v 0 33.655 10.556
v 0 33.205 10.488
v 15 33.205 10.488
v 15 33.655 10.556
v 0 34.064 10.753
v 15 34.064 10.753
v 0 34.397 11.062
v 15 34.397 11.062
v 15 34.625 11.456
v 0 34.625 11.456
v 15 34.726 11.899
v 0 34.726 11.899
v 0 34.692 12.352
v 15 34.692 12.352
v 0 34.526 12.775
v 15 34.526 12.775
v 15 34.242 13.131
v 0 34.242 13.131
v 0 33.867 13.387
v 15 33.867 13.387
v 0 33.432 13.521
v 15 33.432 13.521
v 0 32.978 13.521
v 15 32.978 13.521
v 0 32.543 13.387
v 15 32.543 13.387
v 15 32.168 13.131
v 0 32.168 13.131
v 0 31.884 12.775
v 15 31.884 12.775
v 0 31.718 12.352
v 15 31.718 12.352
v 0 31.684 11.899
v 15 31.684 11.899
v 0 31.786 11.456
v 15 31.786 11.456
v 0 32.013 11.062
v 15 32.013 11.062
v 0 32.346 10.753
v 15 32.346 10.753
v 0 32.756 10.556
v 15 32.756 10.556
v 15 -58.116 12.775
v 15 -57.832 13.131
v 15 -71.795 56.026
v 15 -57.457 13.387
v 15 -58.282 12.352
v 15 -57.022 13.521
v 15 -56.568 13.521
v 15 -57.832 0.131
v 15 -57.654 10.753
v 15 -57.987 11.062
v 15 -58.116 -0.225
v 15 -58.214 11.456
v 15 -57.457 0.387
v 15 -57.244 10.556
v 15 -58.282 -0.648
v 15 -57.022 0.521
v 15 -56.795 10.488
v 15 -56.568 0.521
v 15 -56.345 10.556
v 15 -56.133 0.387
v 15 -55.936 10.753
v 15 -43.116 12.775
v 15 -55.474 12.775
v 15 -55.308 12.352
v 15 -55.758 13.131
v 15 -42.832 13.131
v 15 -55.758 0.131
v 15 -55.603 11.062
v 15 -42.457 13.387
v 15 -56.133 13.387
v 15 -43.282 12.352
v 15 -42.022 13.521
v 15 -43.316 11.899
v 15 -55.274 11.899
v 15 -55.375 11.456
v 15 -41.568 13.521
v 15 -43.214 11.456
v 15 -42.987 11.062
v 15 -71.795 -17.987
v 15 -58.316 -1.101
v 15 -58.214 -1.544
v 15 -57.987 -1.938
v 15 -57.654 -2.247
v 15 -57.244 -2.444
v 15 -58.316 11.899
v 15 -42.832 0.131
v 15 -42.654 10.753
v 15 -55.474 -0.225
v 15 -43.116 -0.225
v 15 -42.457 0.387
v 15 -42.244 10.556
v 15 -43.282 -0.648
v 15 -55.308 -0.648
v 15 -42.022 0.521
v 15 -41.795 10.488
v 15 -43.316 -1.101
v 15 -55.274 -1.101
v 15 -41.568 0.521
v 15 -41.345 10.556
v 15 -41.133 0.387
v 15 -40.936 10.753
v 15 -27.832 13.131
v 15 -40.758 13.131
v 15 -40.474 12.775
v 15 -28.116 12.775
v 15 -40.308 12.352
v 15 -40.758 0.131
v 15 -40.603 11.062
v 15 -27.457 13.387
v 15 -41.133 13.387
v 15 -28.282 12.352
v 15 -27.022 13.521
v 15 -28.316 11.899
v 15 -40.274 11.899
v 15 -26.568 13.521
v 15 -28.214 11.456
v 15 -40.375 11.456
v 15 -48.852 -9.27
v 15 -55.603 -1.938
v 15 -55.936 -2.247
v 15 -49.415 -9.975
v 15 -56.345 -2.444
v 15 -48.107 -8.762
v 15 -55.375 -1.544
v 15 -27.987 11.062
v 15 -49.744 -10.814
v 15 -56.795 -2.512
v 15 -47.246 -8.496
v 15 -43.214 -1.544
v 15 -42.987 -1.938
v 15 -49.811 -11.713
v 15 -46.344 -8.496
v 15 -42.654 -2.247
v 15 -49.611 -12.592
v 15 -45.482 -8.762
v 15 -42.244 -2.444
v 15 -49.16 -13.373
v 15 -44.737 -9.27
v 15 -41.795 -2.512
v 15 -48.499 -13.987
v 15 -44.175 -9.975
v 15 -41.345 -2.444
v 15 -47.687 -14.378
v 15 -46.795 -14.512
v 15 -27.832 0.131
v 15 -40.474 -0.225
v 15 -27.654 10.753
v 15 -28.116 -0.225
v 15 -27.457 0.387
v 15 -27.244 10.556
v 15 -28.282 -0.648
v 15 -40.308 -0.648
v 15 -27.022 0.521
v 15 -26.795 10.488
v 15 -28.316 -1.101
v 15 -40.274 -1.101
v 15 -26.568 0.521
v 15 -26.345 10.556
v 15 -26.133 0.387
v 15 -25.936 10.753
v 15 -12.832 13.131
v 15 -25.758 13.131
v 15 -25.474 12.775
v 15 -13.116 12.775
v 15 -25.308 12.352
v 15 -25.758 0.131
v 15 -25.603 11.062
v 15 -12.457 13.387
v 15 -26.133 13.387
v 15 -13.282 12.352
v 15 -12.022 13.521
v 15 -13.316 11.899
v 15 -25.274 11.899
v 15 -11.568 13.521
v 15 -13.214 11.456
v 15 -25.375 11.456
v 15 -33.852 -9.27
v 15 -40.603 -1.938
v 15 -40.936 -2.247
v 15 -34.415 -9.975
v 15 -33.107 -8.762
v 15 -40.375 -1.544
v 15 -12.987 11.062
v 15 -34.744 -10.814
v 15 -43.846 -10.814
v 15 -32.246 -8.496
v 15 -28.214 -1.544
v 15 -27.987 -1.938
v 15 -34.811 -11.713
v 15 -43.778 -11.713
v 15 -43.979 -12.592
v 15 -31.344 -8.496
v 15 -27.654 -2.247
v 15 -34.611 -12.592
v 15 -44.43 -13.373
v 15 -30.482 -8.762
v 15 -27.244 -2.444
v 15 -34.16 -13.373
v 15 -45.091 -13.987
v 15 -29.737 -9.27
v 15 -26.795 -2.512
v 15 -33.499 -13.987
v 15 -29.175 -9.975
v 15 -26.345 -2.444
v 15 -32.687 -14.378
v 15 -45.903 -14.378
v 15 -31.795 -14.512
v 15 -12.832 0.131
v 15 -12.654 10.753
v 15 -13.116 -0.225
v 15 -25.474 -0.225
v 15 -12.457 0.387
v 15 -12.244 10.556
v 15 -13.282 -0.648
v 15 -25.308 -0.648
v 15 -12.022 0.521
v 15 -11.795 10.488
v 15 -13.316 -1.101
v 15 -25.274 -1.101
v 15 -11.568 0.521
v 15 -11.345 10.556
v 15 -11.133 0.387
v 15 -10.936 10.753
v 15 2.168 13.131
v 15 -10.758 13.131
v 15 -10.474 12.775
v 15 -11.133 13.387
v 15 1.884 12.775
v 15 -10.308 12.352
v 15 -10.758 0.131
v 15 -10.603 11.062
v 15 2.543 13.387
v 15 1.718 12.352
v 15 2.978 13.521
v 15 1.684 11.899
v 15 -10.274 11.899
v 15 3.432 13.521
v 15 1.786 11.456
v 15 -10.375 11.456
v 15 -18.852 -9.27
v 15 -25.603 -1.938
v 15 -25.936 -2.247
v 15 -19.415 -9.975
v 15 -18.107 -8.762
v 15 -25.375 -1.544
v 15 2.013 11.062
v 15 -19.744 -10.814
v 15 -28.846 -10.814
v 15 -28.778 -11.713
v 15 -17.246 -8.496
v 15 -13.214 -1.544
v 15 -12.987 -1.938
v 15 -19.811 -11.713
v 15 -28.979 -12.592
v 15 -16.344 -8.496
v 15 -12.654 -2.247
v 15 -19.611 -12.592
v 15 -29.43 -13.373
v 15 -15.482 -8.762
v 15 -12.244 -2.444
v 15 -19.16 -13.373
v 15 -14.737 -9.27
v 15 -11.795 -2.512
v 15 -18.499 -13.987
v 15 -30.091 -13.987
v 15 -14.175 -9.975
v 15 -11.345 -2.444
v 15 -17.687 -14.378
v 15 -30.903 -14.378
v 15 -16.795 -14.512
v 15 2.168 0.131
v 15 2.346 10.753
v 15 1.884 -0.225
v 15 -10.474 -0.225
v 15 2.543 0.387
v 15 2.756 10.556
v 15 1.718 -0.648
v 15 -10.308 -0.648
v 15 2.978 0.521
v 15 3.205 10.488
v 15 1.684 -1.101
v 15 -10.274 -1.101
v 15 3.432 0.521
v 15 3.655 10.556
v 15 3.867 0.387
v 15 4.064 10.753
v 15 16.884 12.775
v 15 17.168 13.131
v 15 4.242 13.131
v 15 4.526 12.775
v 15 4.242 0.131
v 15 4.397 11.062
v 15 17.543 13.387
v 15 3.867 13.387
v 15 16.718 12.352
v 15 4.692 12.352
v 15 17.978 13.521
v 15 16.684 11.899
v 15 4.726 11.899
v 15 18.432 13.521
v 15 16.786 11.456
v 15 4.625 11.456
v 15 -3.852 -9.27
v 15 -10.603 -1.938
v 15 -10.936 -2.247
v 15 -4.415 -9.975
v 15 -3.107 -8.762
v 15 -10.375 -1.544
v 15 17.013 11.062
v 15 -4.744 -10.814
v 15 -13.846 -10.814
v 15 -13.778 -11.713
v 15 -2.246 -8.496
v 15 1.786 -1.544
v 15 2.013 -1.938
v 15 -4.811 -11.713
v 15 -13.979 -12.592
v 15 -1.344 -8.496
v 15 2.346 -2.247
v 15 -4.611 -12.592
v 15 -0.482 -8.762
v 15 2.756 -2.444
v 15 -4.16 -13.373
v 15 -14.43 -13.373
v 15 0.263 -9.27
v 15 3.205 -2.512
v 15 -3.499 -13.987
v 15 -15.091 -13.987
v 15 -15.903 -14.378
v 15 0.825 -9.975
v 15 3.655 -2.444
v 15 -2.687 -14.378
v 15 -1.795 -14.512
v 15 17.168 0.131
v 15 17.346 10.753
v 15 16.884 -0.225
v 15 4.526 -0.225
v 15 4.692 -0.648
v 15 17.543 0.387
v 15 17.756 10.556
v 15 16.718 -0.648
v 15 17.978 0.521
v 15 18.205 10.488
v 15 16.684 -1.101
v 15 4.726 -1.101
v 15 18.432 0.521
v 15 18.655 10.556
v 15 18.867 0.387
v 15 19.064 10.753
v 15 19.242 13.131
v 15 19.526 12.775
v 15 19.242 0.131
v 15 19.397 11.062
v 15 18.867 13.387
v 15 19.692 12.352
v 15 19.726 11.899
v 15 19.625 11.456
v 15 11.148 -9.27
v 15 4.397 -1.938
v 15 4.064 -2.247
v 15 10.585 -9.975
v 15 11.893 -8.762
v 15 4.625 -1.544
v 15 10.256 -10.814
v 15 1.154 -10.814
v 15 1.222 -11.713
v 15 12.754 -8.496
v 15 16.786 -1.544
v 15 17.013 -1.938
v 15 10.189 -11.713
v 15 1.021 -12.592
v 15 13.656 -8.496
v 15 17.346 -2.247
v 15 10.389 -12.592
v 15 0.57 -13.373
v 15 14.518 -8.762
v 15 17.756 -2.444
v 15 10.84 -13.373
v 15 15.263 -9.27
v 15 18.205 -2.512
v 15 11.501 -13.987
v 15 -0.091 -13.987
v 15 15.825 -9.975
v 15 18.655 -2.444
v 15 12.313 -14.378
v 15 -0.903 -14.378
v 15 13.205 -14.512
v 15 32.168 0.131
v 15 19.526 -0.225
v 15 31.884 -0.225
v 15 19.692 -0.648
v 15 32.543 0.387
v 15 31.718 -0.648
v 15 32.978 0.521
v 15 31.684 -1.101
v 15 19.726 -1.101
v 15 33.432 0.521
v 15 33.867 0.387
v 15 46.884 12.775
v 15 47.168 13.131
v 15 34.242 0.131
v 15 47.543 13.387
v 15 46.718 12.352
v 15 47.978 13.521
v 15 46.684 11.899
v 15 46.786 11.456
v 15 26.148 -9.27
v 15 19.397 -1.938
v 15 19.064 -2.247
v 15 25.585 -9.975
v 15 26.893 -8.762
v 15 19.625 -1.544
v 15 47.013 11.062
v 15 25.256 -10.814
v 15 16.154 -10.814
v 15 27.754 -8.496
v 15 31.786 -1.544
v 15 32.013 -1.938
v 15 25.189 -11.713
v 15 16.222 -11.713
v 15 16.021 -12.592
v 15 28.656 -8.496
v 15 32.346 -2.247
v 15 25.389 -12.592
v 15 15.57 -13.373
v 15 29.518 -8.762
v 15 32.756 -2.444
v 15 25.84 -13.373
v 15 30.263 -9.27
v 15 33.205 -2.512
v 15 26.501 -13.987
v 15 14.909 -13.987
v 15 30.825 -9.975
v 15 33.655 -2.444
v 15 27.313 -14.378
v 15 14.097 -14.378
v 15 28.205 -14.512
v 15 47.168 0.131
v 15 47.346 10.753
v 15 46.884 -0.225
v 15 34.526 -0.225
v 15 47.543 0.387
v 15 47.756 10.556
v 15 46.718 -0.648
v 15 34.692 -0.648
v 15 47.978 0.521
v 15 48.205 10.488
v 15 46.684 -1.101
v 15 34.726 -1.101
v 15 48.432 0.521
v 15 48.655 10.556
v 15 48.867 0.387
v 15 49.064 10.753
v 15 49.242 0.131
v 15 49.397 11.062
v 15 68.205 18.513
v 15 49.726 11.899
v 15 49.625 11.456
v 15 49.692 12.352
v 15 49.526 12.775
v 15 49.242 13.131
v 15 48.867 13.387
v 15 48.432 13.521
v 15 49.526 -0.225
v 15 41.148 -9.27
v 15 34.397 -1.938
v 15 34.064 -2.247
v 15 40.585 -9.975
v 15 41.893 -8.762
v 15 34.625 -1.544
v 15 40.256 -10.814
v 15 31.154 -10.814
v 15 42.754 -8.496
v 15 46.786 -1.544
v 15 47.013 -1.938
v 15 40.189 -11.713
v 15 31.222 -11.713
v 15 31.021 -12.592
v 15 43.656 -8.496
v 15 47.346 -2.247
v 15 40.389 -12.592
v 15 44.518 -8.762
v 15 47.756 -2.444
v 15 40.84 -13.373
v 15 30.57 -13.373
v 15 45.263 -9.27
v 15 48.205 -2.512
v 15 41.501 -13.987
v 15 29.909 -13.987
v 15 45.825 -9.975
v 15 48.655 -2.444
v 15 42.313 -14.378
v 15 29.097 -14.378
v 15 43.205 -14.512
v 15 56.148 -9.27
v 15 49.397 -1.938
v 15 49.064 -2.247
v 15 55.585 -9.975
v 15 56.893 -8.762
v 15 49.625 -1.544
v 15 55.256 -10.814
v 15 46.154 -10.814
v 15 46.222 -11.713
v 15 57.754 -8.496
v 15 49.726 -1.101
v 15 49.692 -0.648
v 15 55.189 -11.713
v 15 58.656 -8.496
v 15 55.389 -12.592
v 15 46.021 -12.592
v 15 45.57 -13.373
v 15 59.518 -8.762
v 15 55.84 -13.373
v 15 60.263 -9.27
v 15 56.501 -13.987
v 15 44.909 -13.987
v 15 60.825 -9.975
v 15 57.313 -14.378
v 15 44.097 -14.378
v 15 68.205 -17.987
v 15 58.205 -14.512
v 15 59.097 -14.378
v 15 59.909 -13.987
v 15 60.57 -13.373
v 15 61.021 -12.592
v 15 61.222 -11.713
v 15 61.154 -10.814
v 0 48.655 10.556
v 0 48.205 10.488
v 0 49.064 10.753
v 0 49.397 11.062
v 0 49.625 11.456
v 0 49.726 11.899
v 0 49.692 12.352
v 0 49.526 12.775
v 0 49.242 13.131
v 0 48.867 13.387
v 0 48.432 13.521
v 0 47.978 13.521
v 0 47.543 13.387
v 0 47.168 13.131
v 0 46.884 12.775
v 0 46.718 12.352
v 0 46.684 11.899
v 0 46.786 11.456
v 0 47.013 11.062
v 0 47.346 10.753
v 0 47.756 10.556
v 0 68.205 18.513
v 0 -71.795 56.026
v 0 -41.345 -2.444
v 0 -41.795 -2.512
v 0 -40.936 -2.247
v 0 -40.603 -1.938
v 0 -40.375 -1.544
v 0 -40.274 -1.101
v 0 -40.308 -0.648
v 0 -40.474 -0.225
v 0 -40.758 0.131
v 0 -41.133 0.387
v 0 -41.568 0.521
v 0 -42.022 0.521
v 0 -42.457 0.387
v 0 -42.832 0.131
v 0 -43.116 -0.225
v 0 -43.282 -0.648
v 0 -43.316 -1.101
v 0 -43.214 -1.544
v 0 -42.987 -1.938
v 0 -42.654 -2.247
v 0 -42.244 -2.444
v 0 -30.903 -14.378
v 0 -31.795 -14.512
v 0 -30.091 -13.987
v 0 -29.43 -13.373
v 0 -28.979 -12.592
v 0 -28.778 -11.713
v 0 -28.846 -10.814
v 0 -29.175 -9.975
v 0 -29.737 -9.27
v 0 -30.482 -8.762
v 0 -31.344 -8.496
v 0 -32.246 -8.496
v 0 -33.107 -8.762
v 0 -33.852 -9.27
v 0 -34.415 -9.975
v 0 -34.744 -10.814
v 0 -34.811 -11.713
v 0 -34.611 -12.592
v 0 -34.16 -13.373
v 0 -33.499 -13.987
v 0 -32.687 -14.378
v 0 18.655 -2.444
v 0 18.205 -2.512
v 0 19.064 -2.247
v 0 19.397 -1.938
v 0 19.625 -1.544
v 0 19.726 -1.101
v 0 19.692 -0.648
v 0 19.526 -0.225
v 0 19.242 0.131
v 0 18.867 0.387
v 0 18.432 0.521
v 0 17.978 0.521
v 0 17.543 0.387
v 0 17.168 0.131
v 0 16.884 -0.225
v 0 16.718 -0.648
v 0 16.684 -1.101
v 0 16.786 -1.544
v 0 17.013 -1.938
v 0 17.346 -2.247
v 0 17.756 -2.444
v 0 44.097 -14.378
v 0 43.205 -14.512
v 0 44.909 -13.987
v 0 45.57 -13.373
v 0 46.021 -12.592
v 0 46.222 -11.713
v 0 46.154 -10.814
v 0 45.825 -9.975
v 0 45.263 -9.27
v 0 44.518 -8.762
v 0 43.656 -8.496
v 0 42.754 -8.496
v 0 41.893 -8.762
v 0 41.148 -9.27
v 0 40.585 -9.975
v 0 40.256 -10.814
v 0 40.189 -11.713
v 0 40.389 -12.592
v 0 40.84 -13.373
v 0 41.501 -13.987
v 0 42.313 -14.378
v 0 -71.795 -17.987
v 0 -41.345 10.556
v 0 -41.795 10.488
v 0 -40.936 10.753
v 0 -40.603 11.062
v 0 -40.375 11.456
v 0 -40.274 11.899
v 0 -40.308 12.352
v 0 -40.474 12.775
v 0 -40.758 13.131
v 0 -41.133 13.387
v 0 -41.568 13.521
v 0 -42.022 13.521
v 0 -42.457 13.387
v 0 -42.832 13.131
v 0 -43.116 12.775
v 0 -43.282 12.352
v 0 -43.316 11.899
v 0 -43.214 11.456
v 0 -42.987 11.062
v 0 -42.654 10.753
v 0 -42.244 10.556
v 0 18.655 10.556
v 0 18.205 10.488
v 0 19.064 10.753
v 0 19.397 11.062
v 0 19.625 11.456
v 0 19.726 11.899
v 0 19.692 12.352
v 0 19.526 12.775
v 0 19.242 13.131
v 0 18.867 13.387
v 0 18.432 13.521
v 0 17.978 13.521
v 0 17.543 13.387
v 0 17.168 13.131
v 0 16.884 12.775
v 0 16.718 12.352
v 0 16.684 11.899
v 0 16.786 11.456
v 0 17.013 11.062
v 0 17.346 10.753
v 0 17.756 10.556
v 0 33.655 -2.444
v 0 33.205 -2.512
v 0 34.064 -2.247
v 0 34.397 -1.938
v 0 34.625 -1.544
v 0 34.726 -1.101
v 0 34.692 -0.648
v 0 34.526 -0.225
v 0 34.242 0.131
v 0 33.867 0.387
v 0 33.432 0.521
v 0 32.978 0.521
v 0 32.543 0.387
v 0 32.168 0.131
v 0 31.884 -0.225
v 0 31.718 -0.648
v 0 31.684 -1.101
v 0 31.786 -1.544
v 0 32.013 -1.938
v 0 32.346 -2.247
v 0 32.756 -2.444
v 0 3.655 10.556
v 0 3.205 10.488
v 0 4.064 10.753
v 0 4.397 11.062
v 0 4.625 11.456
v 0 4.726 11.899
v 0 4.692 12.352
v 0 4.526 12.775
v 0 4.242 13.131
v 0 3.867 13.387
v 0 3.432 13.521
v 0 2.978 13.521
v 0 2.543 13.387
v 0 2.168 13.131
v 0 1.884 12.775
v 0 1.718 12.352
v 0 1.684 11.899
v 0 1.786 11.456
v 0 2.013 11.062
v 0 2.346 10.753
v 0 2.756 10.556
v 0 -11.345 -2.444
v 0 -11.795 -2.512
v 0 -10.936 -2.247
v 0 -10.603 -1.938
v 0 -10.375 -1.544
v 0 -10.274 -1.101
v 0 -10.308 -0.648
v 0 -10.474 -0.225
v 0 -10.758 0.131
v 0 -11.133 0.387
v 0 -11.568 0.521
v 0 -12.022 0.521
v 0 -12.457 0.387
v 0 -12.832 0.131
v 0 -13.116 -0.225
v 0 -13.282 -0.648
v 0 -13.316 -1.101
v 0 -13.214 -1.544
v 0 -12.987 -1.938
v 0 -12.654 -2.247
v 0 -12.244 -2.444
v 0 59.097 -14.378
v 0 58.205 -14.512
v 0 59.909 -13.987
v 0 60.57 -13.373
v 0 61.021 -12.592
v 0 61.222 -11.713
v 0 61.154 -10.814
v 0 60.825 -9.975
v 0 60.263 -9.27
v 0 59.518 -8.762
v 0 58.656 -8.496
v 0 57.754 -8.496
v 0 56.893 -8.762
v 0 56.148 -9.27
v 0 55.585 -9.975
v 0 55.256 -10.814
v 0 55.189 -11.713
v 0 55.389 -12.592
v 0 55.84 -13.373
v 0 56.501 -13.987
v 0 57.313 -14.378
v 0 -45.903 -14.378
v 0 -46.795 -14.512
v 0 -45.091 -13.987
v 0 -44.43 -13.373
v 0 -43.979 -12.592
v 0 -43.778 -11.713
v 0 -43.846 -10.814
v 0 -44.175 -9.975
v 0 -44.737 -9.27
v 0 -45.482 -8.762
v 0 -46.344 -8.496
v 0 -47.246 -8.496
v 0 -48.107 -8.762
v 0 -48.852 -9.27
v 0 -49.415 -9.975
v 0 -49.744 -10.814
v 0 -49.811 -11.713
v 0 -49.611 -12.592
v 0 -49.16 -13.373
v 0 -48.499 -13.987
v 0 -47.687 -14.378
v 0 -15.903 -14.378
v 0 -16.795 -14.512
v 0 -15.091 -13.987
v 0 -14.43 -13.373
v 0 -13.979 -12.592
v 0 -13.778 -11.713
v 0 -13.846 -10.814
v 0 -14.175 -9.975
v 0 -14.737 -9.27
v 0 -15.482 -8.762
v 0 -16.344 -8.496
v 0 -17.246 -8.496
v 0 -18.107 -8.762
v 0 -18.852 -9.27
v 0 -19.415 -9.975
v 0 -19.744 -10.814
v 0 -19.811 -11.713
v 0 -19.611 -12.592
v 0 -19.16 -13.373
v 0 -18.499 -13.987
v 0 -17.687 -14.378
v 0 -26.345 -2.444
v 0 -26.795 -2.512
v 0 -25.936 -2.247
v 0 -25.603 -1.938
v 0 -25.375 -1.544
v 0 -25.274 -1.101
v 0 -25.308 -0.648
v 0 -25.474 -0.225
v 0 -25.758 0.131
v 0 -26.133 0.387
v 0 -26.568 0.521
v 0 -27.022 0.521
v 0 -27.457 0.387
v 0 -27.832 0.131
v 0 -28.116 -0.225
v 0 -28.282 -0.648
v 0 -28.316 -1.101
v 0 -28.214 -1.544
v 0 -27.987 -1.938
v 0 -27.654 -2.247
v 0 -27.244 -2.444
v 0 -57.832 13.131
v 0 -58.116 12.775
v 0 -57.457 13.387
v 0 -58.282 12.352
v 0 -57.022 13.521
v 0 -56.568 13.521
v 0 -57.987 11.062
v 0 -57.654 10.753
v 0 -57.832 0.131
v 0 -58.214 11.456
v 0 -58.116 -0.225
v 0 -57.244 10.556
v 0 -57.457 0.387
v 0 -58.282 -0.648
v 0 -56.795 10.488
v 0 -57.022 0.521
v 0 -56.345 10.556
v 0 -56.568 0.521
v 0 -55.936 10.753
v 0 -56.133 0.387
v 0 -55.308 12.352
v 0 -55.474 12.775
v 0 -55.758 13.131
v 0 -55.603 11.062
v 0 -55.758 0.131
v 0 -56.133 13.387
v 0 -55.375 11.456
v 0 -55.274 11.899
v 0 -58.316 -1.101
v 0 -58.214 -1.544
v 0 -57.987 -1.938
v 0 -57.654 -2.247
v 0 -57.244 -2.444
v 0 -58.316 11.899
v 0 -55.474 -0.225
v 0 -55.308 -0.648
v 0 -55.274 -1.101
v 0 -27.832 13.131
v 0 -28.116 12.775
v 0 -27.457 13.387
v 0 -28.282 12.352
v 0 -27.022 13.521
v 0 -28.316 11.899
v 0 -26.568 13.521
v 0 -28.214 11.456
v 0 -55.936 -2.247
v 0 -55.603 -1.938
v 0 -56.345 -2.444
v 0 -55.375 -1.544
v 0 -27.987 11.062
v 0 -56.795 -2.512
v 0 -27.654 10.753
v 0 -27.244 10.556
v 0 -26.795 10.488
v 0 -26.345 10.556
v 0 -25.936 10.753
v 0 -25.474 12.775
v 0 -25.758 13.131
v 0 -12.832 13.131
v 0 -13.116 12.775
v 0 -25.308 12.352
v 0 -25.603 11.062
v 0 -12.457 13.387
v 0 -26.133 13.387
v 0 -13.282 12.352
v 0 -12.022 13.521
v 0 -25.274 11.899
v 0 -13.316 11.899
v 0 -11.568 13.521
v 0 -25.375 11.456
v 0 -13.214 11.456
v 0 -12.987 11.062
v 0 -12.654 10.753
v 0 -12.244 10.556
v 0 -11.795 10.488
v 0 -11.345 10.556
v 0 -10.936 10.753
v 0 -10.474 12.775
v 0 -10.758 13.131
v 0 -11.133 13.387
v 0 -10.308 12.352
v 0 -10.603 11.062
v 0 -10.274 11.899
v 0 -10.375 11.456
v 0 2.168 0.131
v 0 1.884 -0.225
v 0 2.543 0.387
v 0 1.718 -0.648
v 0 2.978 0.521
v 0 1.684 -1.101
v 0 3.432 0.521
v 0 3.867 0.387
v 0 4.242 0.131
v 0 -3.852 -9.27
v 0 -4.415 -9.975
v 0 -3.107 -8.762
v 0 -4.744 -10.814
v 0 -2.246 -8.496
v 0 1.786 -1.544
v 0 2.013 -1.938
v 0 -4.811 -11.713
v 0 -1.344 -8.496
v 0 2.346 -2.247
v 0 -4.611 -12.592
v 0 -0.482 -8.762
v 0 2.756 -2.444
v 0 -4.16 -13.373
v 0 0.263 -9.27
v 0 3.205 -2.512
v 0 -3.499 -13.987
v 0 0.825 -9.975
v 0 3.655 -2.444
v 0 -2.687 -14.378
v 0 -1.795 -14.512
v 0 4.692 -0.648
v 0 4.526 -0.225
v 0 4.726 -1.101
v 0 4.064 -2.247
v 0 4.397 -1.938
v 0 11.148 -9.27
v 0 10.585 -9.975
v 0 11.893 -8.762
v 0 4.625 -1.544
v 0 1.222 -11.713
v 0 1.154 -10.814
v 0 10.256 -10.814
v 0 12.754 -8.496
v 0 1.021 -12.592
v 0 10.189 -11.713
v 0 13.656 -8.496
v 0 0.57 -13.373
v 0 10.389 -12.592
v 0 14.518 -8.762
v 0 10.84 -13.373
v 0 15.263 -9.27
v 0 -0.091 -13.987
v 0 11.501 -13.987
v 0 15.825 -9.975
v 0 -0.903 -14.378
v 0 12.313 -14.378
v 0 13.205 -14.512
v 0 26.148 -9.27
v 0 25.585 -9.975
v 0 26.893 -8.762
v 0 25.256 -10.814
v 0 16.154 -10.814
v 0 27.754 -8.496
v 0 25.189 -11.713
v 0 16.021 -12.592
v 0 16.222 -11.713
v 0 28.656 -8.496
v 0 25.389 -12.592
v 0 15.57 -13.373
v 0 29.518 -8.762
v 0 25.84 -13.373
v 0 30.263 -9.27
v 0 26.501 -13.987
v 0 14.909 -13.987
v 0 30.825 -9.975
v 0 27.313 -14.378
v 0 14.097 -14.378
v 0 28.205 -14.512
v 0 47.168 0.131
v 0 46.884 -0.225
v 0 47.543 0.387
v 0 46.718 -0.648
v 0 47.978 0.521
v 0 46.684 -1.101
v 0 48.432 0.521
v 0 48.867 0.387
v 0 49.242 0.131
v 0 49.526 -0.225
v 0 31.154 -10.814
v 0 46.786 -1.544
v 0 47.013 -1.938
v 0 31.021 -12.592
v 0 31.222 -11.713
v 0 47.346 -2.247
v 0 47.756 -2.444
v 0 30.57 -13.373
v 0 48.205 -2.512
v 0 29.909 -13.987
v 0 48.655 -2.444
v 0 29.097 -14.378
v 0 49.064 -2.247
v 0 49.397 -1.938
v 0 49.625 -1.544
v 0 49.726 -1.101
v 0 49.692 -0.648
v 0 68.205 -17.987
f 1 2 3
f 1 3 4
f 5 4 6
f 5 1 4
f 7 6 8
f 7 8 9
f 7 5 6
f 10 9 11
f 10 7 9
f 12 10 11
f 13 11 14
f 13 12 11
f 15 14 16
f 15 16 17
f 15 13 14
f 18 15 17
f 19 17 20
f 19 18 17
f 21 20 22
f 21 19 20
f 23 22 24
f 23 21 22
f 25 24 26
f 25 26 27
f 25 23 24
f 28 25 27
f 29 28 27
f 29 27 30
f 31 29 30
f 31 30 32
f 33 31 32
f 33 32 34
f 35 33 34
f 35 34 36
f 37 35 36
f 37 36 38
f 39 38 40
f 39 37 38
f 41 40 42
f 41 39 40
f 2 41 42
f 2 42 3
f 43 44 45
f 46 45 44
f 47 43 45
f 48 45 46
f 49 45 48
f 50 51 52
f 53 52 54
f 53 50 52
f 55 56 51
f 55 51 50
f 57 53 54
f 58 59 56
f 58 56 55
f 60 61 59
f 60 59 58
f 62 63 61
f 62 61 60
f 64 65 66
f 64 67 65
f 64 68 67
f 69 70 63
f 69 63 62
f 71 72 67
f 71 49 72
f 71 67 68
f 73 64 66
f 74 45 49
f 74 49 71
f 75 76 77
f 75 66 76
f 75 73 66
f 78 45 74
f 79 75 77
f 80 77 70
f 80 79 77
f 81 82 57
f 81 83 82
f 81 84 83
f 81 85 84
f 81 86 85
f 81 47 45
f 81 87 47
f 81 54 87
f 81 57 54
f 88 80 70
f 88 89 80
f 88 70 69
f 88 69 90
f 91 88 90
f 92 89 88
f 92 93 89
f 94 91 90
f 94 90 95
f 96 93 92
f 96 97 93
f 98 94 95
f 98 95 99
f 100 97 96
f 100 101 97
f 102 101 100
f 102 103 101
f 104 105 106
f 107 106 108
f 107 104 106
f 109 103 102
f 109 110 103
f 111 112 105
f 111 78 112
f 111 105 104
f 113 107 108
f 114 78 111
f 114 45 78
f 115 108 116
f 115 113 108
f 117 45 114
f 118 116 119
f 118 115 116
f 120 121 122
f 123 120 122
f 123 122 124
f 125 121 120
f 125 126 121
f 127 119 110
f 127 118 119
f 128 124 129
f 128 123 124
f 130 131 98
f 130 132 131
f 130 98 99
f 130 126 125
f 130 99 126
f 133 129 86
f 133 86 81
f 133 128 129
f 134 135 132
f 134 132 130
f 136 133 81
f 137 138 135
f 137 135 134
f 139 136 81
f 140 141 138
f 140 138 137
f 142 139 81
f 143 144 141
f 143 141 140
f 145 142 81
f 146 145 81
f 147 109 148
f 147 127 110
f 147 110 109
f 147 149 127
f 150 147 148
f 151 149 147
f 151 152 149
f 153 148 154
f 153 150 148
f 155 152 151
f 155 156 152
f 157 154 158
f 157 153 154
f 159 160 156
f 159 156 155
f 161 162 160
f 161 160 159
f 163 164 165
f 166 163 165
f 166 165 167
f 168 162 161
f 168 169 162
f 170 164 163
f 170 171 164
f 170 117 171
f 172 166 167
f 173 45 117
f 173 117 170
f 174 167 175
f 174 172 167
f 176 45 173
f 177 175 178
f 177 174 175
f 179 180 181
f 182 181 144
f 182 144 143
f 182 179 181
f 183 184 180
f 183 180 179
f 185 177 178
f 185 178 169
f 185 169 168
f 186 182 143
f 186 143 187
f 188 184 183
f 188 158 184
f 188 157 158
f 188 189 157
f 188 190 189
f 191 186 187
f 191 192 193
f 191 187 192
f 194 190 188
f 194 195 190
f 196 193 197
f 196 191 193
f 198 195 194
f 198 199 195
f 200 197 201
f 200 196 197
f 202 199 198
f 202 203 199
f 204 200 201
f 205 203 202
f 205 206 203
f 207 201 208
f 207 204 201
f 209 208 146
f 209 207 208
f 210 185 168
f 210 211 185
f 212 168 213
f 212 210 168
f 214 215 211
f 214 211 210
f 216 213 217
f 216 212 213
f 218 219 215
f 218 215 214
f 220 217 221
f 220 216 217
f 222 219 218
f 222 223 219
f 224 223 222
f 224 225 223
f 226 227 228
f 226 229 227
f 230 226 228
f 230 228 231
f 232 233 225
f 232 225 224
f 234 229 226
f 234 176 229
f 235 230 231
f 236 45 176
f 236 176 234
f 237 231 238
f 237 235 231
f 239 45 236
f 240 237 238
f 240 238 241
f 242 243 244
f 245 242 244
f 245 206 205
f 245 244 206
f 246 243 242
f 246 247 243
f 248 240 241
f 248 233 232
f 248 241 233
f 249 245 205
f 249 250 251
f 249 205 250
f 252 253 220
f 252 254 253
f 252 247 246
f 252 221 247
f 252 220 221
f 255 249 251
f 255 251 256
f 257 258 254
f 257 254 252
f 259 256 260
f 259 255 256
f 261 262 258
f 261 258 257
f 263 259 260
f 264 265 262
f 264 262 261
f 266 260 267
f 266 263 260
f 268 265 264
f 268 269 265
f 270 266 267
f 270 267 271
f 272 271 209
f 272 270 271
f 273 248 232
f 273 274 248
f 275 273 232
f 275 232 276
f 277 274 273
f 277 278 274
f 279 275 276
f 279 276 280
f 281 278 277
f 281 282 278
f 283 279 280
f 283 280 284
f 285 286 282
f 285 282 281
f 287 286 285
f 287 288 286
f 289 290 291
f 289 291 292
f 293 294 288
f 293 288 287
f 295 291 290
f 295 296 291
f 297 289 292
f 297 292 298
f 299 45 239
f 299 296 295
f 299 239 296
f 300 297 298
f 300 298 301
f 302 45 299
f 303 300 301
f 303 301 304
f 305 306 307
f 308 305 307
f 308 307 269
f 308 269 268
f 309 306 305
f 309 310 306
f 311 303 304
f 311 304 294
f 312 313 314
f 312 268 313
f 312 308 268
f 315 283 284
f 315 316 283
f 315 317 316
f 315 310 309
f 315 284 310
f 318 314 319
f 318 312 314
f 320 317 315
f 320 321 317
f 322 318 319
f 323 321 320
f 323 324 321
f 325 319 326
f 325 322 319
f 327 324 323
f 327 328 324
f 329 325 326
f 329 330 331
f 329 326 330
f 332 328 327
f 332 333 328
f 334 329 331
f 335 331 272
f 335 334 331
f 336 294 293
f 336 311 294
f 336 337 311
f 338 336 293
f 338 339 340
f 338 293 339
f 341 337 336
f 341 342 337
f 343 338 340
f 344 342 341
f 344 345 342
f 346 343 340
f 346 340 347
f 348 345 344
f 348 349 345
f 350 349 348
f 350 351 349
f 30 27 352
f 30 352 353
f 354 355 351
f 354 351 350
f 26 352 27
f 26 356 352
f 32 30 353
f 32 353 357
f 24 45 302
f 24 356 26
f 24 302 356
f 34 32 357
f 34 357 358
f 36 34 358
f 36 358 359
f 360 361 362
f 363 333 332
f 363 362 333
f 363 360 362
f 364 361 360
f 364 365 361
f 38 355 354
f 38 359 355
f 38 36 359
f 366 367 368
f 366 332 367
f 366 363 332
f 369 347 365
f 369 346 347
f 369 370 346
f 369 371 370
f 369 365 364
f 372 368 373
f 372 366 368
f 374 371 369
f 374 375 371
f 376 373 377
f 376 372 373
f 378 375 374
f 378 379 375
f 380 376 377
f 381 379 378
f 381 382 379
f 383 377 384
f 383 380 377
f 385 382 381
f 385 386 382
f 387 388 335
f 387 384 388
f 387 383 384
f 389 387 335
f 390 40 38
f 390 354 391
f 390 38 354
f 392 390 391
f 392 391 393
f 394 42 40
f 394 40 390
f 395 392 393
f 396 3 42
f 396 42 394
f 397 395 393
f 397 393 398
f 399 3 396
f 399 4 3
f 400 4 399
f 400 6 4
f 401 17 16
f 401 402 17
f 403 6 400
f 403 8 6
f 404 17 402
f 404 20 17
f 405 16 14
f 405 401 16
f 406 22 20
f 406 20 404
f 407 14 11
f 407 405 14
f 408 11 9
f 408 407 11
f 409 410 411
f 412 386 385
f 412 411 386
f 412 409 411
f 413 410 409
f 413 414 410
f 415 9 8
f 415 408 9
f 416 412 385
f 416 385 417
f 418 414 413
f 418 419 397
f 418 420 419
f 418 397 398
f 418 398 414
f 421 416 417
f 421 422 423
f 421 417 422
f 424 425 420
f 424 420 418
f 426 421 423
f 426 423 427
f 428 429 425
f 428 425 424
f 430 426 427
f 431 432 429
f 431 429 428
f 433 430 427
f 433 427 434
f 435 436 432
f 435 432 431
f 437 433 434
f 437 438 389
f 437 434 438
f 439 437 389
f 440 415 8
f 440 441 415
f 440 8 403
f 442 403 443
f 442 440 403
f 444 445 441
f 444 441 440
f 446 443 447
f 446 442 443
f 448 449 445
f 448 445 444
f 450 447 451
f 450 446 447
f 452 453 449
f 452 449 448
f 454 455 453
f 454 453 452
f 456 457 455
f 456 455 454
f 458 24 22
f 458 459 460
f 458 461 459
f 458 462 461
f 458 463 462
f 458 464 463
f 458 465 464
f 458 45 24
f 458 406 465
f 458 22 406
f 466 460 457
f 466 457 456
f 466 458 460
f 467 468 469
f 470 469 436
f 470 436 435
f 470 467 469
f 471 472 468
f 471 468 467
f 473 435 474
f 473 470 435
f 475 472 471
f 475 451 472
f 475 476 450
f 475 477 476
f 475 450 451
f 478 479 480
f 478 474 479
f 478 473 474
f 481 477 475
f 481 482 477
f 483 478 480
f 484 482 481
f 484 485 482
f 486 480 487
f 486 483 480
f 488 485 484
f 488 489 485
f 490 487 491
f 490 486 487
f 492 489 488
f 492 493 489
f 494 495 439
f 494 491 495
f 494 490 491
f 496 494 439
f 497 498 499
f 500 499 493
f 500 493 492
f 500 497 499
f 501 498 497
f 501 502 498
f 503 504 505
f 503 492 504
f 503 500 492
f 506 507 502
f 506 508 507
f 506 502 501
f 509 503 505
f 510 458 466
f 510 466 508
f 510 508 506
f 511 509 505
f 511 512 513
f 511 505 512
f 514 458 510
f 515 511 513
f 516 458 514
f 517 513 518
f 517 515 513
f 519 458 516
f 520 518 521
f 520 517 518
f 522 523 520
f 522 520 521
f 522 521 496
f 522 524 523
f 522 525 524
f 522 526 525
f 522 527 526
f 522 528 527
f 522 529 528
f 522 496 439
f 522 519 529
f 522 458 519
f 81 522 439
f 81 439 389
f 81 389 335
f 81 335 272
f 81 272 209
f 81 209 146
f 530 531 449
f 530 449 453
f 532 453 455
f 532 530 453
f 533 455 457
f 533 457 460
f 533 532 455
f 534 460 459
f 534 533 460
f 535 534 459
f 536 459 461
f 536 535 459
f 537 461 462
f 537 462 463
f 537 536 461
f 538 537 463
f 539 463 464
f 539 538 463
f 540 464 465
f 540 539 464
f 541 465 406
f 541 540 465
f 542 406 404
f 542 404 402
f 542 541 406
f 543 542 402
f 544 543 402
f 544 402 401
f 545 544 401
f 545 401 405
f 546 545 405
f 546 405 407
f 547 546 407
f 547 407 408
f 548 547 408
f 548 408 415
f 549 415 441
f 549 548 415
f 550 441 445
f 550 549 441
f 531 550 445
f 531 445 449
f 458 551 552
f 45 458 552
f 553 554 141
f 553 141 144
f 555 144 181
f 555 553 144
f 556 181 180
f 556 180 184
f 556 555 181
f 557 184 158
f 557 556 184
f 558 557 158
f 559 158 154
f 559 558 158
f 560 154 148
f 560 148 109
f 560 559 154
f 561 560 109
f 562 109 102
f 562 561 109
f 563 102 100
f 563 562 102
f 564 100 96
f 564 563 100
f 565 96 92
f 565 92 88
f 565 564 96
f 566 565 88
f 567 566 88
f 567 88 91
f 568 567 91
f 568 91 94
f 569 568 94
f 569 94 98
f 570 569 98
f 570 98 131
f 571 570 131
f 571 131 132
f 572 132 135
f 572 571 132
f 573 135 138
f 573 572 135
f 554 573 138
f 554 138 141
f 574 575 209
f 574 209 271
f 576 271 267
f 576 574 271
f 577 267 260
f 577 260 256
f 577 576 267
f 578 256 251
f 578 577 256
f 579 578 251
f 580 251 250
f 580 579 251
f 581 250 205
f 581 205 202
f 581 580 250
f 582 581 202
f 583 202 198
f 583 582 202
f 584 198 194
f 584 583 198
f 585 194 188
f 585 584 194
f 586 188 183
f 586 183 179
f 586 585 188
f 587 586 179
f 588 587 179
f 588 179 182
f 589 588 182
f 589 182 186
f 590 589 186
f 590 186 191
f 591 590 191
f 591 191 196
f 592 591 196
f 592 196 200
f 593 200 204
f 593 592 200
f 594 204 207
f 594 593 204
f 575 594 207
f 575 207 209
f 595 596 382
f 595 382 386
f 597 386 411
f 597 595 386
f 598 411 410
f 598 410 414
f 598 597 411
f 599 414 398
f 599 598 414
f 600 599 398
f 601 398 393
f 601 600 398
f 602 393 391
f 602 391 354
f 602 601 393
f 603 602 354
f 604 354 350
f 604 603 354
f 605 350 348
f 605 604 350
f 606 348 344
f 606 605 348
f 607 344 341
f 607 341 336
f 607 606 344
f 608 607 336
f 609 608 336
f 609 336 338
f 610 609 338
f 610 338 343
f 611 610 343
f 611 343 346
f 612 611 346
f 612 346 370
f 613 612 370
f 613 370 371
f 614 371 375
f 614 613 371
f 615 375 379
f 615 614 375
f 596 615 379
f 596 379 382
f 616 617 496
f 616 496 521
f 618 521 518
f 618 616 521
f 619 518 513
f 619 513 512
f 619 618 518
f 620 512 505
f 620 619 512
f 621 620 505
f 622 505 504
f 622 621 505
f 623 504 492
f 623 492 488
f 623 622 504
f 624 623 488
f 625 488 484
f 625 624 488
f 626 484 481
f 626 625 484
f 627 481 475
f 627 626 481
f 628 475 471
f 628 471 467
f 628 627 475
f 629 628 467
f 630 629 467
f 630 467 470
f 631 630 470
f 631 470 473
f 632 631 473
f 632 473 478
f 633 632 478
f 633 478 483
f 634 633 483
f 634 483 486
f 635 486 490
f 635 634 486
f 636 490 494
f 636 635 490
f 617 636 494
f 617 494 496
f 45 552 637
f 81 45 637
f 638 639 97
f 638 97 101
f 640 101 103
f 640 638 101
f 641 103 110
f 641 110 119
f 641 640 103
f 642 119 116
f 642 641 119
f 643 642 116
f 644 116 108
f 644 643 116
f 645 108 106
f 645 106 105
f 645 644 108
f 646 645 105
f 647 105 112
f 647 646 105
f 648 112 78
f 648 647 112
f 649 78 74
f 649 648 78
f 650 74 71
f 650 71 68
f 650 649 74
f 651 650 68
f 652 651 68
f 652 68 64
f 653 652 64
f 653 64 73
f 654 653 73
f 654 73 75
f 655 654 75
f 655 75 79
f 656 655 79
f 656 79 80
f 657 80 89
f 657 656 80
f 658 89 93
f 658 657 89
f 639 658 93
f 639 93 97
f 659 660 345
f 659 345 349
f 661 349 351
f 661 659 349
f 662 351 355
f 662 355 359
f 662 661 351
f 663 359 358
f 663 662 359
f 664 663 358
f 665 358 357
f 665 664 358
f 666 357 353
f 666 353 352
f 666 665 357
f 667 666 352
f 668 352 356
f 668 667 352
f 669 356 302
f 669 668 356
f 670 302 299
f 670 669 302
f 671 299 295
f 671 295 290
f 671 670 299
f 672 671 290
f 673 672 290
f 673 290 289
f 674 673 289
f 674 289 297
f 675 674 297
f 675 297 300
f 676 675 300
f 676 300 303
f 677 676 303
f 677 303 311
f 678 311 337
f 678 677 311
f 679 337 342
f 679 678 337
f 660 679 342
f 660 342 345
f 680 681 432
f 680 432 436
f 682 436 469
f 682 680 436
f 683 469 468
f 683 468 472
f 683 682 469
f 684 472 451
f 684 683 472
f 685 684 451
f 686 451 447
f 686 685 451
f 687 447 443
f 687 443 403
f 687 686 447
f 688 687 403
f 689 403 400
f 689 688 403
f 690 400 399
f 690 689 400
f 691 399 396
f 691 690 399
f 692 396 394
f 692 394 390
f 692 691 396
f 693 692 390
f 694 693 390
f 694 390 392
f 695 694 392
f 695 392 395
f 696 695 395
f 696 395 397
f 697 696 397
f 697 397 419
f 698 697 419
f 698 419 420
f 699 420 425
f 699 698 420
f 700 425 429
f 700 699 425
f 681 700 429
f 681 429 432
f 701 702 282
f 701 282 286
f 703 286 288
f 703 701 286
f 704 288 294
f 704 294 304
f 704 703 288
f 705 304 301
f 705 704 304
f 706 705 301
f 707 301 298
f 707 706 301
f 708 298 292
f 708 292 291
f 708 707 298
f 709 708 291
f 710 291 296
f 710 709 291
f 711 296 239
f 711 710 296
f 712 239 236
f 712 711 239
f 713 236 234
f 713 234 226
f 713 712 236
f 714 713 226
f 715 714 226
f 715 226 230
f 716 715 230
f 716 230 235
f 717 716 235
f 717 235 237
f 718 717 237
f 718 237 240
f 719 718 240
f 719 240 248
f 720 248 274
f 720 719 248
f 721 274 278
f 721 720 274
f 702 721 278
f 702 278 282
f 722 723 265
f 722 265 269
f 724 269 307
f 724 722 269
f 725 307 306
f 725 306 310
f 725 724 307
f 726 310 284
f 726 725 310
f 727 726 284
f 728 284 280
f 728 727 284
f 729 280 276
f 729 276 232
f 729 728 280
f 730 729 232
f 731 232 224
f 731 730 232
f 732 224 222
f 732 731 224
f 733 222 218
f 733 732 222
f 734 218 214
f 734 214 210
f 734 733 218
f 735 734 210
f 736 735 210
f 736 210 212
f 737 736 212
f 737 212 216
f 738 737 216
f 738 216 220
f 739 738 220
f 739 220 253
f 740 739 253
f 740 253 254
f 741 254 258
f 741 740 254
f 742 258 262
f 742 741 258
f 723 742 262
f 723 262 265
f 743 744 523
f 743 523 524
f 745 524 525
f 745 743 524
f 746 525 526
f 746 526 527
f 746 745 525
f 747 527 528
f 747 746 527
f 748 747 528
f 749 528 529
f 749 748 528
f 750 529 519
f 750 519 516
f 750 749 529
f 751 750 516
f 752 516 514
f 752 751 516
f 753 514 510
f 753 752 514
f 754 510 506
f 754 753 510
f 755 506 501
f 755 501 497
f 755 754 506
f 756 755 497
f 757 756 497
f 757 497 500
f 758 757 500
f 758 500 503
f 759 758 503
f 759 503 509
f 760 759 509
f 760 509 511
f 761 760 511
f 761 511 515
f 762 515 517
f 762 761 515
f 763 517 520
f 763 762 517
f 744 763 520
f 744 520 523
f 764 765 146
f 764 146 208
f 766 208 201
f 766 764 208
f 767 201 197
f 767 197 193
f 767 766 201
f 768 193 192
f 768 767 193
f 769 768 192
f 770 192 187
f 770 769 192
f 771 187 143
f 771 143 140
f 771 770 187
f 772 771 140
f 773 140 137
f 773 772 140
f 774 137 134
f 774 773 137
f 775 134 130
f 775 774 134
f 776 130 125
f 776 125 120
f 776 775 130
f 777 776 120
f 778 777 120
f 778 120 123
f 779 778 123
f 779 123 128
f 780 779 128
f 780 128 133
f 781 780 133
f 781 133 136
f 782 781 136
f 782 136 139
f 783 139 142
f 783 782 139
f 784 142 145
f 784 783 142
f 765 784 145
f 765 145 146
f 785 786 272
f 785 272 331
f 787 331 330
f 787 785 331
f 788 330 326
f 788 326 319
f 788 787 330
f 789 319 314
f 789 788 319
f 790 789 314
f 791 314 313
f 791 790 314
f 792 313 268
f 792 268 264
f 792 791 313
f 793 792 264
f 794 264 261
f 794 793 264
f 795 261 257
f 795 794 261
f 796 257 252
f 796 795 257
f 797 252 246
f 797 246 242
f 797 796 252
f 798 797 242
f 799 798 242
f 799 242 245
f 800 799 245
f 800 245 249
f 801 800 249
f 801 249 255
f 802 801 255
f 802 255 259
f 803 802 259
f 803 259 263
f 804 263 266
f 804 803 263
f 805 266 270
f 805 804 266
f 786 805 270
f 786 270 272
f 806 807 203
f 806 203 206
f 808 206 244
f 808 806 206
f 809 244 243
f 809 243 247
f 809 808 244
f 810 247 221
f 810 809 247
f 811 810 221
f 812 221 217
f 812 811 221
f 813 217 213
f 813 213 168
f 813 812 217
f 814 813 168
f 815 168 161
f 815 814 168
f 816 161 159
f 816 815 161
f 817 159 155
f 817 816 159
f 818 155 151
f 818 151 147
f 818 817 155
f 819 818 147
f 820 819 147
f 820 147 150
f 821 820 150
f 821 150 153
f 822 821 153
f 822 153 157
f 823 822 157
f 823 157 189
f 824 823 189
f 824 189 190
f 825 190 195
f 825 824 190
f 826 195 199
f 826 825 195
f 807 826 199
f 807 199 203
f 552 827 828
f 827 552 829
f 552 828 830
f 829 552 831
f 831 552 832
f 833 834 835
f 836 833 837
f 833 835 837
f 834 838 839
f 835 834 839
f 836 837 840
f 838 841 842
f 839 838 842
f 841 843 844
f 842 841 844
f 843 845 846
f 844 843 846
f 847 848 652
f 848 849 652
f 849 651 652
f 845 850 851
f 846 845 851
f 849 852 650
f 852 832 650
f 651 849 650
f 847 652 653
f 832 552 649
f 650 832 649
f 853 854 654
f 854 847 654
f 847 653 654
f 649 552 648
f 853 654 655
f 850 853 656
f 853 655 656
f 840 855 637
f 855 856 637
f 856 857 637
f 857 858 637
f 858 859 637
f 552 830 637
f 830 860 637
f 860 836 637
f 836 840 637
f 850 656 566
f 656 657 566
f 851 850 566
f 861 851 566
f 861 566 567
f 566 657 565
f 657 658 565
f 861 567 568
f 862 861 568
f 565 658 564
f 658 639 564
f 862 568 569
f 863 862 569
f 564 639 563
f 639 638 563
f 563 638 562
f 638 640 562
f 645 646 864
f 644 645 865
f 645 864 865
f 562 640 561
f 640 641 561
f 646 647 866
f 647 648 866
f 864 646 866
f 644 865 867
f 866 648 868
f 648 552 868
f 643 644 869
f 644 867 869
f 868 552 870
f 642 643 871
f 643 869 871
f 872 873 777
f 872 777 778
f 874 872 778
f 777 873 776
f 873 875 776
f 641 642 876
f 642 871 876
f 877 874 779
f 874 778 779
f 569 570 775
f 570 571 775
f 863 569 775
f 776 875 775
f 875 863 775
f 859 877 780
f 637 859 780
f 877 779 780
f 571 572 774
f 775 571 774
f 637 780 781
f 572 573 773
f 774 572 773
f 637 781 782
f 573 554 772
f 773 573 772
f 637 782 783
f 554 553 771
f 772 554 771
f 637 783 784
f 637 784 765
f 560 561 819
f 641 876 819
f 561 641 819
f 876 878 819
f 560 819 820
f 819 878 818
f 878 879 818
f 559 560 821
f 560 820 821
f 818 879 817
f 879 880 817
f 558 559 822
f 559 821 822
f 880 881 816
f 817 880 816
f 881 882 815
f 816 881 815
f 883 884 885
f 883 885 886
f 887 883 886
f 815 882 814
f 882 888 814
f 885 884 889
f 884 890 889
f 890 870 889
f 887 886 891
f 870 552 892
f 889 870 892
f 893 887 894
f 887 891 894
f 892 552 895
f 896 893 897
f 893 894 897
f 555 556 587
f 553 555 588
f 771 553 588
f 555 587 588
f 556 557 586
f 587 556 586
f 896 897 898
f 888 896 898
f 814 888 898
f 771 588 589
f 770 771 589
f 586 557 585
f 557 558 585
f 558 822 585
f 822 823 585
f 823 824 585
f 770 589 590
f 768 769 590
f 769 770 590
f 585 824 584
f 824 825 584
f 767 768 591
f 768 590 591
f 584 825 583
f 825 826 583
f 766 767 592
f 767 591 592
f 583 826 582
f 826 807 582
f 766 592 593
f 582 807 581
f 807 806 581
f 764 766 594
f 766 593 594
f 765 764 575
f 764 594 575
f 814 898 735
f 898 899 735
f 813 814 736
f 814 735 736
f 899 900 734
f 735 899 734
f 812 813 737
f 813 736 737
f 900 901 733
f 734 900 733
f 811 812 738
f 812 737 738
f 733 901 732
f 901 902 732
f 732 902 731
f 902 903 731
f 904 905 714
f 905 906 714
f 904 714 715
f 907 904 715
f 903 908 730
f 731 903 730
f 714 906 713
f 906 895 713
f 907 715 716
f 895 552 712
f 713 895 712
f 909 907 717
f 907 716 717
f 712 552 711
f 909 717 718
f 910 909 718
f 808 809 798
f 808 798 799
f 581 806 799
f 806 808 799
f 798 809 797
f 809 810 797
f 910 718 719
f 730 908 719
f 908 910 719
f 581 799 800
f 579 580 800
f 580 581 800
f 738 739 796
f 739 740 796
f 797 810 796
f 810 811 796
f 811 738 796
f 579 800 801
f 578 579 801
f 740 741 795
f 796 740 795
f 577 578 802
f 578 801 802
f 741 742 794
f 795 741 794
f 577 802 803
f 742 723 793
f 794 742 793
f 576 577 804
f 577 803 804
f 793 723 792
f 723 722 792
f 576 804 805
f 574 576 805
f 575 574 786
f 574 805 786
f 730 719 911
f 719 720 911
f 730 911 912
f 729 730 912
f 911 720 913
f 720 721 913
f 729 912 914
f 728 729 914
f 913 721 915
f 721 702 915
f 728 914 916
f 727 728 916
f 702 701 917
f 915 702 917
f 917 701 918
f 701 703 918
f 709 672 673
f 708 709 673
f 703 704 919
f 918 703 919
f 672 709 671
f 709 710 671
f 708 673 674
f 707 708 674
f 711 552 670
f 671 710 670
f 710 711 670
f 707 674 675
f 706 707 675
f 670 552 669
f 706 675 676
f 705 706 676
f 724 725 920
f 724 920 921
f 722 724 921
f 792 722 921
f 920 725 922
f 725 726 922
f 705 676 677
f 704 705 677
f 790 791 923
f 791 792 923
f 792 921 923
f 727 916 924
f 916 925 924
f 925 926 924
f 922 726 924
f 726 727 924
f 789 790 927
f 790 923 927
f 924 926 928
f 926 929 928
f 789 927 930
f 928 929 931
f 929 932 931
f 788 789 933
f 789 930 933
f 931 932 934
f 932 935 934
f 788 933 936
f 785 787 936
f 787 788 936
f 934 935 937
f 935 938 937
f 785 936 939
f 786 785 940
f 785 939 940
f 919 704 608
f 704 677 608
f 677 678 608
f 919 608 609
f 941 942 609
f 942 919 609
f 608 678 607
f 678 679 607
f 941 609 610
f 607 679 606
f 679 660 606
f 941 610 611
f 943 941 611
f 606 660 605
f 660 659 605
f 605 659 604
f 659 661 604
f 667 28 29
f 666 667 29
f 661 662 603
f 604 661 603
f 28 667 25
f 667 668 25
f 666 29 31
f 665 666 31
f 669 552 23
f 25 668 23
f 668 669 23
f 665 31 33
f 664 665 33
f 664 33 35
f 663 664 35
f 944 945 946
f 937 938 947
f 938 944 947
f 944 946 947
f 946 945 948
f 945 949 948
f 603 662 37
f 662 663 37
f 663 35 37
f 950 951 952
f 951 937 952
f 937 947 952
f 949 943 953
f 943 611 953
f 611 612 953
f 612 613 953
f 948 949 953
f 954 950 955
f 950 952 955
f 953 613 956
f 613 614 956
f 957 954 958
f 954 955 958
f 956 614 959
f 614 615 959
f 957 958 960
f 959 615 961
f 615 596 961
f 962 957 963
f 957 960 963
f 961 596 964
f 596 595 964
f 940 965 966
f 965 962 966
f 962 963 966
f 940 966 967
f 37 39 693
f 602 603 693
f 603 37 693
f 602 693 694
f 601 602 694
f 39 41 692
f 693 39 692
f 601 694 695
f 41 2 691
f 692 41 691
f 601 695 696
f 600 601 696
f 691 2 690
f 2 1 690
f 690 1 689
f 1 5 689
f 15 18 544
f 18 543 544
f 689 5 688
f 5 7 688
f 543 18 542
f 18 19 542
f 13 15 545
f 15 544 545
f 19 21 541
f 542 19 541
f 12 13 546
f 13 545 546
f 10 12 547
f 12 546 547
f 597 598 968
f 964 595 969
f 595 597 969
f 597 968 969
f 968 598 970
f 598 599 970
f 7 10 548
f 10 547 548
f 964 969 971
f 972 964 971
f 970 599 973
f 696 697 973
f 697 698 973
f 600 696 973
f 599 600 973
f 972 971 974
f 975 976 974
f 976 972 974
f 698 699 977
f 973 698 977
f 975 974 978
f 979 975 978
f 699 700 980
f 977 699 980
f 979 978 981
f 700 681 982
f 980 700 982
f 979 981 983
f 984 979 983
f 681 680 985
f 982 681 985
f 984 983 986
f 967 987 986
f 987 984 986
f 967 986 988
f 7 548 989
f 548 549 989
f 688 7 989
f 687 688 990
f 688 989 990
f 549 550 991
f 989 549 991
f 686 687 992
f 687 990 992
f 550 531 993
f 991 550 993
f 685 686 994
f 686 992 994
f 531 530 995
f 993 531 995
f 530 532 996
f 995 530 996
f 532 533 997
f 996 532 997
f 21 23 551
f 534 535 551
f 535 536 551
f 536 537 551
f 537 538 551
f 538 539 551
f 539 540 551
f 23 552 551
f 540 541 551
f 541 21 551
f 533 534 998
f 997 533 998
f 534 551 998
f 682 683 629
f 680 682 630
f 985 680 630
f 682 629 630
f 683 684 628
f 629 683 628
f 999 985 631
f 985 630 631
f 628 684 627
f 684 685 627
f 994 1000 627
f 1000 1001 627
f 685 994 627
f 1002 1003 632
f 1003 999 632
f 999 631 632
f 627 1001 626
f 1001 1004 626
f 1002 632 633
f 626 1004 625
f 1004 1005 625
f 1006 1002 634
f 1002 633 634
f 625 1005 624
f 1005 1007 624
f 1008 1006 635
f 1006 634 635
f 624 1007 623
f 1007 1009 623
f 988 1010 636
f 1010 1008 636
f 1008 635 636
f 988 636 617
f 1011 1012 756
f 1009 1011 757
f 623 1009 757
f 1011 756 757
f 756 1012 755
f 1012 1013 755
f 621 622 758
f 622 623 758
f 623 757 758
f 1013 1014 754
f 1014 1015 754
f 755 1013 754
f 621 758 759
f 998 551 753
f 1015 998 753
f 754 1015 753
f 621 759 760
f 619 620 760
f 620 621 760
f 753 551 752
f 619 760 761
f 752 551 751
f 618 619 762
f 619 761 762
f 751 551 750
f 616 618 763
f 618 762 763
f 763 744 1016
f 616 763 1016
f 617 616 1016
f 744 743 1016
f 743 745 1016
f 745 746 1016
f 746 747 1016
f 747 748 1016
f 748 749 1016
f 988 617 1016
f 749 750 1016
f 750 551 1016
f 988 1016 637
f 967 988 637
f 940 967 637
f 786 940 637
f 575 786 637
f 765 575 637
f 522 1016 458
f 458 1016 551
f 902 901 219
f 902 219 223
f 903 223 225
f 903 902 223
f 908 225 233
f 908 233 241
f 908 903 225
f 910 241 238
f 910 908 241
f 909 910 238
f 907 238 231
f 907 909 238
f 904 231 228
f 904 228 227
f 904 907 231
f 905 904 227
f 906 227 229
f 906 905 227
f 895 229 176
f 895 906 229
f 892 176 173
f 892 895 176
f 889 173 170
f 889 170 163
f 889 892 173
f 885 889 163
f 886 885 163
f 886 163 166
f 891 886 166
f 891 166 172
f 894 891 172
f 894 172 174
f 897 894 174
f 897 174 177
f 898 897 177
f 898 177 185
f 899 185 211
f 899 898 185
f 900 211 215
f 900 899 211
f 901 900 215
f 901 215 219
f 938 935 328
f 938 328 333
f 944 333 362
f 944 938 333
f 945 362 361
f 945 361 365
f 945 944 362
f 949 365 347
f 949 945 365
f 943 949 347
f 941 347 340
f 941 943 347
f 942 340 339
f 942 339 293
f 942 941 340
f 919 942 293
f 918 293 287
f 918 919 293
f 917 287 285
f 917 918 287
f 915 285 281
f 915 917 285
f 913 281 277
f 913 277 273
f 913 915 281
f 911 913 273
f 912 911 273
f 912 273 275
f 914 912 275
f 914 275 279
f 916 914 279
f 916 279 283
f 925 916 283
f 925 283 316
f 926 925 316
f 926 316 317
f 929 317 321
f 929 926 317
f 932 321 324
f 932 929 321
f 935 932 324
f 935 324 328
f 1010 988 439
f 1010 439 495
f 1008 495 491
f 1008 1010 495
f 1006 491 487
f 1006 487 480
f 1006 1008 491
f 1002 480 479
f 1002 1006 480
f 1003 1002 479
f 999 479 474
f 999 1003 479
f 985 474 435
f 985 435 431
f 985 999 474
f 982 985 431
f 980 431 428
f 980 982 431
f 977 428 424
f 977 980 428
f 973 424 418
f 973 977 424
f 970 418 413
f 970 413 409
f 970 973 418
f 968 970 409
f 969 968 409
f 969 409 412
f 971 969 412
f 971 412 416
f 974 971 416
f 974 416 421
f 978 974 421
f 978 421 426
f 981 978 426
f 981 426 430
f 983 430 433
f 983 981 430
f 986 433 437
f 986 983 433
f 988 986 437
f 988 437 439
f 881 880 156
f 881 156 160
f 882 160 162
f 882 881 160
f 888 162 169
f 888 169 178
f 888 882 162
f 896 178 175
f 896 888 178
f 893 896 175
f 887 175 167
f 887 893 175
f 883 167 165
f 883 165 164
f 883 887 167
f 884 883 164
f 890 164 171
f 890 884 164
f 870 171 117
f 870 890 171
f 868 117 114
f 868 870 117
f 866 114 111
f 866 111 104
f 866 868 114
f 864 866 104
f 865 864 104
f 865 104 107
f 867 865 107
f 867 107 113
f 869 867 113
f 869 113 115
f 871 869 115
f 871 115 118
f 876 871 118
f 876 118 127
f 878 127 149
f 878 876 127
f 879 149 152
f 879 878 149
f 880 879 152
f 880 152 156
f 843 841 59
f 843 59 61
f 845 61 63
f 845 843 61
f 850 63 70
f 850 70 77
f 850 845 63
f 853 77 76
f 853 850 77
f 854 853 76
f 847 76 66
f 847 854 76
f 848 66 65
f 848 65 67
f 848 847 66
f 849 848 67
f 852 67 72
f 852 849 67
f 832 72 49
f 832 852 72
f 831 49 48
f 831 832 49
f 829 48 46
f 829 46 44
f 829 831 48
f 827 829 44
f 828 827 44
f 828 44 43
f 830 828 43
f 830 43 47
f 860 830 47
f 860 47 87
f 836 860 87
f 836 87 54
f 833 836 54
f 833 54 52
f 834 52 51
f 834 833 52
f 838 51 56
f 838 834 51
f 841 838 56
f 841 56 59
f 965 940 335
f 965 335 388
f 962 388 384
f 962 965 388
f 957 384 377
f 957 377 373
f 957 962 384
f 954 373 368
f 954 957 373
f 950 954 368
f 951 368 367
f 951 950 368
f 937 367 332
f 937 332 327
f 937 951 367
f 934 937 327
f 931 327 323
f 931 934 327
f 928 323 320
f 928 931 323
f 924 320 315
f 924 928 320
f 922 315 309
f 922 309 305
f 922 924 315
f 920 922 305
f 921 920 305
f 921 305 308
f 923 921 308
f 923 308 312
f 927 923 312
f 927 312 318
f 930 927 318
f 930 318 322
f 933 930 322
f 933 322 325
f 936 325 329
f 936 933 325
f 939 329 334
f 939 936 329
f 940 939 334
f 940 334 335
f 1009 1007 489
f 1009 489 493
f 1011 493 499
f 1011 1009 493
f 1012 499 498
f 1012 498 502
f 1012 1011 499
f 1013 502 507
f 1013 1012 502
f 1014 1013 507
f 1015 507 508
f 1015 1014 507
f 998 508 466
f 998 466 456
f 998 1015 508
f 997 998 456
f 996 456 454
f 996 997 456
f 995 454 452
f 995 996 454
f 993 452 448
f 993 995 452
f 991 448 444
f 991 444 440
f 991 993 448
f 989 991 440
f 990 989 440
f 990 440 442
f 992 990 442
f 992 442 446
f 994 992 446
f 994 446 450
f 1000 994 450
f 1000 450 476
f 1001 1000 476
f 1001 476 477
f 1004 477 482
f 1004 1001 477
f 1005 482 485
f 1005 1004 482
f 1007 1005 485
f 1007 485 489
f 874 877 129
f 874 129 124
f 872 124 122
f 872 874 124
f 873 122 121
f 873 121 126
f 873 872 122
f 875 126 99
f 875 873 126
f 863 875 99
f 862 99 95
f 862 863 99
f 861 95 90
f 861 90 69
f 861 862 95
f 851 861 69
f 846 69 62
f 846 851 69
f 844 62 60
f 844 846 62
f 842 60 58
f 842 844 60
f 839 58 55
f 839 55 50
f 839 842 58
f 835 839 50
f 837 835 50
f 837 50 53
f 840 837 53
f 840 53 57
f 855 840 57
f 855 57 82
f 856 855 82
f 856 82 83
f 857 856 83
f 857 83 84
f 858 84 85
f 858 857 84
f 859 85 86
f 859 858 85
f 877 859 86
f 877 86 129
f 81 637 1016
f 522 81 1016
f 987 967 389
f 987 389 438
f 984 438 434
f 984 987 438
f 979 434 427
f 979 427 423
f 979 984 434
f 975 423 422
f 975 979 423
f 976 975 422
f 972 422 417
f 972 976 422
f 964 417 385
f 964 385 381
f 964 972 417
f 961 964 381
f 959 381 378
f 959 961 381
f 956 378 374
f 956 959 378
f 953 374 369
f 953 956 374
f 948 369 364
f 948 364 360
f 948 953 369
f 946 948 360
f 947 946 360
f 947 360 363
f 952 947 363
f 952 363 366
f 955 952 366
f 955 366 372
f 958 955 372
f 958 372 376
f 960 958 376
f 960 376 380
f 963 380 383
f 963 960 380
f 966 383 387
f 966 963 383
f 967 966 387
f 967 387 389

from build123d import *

# Parameters (mm, degrees)
SKETCH2_R           = 3.025
SKETCH2_R_2         = 1.525
BOSS_EXTRUDE2_DEPTH = 15


with BuildPart() as part:
    # Sketch2 → Boss-Extrude2 (new body)
    with BuildSketch(Plane(origin=(0, 0, 0), x_dir=(0, 0, -1), z_dir=(1, 0, 0))):
        Polygon((-56.025707453, -71.794871795), (17.987179487, -71.794871795), (17.987179487, 68.205128205), (-18.512820513, 68.205128205), align=None)
        with Locations((11.487179487, 58.205128205)):
            Circle(SKETCH2_R, mode=Mode.SUBTRACT)
        with Locations((11.487179487, 43.205128205)):
            Circle(SKETCH2_R, mode=Mode.SUBTRACT)
        with Locations((11.487179487, 28.205128205)):
            Circle(SKETCH2_R, mode=Mode.SUBTRACT)
        with Locations((11.487179487, 13.205128205)):
            Circle(SKETCH2_R, mode=Mode.SUBTRACT)
        with Locations((11.487179487, -1.794871795)):
            Circle(SKETCH2_R, mode=Mode.SUBTRACT)
        with Locations((11.487179487, -16.794871795)):
            Circle(SKETCH2_R, mode=Mode.SUBTRACT)
        with Locations((11.487179487, -31.794871795)):
            Circle(SKETCH2_R, mode=Mode.SUBTRACT)
        with Locations((11.487179487, -46.794871795)):
            Circle(SKETCH2_R, mode=Mode.SUBTRACT)
        with Locations((0.987179487, 48.205128205)):
            Circle(SKETCH2_R_2, mode=Mode.SUBTRACT)
        with Locations((-12.012820513, 48.205128205)):
            Circle(SKETCH2_R_2, mode=Mode.SUBTRACT)
        with Locations((0.987179487, 33.205128205)):
            Circle(SKETCH2_R_2, mode=Mode.SUBTRACT)
        with Locations((-12.012820513, 33.205128205)):
            Circle(SKETCH2_R_2, mode=Mode.SUBTRACT)
        with Locations((0.987179487, 18.205128205)):
            Circle(SKETCH2_R_2, mode=Mode.SUBTRACT)
        with Locations((-12.012820513, 18.205128205)):
            Circle(SKETCH2_R_2, mode=Mode.SUBTRACT)
        with Locations((0.987179487, 3.205128205)):
            Circle(SKETCH2_R_2, mode=Mode.SUBTRACT)
        with Locations((-12.012820513, 3.205128205)):
            Circle(SKETCH2_R_2, mode=Mode.SUBTRACT)
        with Locations((0.987179487, -11.794871795)):
            Circle(SKETCH2_R_2, mode=Mode.SUBTRACT)
        with Locations((-12.012820513, -11.794871795)):
            Circle(SKETCH2_R_2, mode=Mode.SUBTRACT)
        with Locations((0.987179487, -26.794871795)):
            Circle(SKETCH2_R_2, mode=Mode.SUBTRACT)
        with Locations((-12.012820513, -26.794871795)):
            Circle(SKETCH2_R_2, mode=Mode.SUBTRACT)
        with Locations((0.987179487, -41.794871795)):
            Circle(SKETCH2_R_2, mode=Mode.SUBTRACT)
        with Locations((-12.012820513, -41.794871795)):
            Circle(SKETCH2_R_2, mode=Mode.SUBTRACT)
        with Locations((0.987179487, -56.794871795)):
            Circle(SKETCH2_R_2, mode=Mode.SUBTRACT)
        with Locations((-12.012820513, -56.794871795)):
            Circle(SKETCH2_R_2, mode=Mode.SUBTRACT)
    extrude(amount=BOSS_EXTRUDE2_DEPTH)


solid = part.part
